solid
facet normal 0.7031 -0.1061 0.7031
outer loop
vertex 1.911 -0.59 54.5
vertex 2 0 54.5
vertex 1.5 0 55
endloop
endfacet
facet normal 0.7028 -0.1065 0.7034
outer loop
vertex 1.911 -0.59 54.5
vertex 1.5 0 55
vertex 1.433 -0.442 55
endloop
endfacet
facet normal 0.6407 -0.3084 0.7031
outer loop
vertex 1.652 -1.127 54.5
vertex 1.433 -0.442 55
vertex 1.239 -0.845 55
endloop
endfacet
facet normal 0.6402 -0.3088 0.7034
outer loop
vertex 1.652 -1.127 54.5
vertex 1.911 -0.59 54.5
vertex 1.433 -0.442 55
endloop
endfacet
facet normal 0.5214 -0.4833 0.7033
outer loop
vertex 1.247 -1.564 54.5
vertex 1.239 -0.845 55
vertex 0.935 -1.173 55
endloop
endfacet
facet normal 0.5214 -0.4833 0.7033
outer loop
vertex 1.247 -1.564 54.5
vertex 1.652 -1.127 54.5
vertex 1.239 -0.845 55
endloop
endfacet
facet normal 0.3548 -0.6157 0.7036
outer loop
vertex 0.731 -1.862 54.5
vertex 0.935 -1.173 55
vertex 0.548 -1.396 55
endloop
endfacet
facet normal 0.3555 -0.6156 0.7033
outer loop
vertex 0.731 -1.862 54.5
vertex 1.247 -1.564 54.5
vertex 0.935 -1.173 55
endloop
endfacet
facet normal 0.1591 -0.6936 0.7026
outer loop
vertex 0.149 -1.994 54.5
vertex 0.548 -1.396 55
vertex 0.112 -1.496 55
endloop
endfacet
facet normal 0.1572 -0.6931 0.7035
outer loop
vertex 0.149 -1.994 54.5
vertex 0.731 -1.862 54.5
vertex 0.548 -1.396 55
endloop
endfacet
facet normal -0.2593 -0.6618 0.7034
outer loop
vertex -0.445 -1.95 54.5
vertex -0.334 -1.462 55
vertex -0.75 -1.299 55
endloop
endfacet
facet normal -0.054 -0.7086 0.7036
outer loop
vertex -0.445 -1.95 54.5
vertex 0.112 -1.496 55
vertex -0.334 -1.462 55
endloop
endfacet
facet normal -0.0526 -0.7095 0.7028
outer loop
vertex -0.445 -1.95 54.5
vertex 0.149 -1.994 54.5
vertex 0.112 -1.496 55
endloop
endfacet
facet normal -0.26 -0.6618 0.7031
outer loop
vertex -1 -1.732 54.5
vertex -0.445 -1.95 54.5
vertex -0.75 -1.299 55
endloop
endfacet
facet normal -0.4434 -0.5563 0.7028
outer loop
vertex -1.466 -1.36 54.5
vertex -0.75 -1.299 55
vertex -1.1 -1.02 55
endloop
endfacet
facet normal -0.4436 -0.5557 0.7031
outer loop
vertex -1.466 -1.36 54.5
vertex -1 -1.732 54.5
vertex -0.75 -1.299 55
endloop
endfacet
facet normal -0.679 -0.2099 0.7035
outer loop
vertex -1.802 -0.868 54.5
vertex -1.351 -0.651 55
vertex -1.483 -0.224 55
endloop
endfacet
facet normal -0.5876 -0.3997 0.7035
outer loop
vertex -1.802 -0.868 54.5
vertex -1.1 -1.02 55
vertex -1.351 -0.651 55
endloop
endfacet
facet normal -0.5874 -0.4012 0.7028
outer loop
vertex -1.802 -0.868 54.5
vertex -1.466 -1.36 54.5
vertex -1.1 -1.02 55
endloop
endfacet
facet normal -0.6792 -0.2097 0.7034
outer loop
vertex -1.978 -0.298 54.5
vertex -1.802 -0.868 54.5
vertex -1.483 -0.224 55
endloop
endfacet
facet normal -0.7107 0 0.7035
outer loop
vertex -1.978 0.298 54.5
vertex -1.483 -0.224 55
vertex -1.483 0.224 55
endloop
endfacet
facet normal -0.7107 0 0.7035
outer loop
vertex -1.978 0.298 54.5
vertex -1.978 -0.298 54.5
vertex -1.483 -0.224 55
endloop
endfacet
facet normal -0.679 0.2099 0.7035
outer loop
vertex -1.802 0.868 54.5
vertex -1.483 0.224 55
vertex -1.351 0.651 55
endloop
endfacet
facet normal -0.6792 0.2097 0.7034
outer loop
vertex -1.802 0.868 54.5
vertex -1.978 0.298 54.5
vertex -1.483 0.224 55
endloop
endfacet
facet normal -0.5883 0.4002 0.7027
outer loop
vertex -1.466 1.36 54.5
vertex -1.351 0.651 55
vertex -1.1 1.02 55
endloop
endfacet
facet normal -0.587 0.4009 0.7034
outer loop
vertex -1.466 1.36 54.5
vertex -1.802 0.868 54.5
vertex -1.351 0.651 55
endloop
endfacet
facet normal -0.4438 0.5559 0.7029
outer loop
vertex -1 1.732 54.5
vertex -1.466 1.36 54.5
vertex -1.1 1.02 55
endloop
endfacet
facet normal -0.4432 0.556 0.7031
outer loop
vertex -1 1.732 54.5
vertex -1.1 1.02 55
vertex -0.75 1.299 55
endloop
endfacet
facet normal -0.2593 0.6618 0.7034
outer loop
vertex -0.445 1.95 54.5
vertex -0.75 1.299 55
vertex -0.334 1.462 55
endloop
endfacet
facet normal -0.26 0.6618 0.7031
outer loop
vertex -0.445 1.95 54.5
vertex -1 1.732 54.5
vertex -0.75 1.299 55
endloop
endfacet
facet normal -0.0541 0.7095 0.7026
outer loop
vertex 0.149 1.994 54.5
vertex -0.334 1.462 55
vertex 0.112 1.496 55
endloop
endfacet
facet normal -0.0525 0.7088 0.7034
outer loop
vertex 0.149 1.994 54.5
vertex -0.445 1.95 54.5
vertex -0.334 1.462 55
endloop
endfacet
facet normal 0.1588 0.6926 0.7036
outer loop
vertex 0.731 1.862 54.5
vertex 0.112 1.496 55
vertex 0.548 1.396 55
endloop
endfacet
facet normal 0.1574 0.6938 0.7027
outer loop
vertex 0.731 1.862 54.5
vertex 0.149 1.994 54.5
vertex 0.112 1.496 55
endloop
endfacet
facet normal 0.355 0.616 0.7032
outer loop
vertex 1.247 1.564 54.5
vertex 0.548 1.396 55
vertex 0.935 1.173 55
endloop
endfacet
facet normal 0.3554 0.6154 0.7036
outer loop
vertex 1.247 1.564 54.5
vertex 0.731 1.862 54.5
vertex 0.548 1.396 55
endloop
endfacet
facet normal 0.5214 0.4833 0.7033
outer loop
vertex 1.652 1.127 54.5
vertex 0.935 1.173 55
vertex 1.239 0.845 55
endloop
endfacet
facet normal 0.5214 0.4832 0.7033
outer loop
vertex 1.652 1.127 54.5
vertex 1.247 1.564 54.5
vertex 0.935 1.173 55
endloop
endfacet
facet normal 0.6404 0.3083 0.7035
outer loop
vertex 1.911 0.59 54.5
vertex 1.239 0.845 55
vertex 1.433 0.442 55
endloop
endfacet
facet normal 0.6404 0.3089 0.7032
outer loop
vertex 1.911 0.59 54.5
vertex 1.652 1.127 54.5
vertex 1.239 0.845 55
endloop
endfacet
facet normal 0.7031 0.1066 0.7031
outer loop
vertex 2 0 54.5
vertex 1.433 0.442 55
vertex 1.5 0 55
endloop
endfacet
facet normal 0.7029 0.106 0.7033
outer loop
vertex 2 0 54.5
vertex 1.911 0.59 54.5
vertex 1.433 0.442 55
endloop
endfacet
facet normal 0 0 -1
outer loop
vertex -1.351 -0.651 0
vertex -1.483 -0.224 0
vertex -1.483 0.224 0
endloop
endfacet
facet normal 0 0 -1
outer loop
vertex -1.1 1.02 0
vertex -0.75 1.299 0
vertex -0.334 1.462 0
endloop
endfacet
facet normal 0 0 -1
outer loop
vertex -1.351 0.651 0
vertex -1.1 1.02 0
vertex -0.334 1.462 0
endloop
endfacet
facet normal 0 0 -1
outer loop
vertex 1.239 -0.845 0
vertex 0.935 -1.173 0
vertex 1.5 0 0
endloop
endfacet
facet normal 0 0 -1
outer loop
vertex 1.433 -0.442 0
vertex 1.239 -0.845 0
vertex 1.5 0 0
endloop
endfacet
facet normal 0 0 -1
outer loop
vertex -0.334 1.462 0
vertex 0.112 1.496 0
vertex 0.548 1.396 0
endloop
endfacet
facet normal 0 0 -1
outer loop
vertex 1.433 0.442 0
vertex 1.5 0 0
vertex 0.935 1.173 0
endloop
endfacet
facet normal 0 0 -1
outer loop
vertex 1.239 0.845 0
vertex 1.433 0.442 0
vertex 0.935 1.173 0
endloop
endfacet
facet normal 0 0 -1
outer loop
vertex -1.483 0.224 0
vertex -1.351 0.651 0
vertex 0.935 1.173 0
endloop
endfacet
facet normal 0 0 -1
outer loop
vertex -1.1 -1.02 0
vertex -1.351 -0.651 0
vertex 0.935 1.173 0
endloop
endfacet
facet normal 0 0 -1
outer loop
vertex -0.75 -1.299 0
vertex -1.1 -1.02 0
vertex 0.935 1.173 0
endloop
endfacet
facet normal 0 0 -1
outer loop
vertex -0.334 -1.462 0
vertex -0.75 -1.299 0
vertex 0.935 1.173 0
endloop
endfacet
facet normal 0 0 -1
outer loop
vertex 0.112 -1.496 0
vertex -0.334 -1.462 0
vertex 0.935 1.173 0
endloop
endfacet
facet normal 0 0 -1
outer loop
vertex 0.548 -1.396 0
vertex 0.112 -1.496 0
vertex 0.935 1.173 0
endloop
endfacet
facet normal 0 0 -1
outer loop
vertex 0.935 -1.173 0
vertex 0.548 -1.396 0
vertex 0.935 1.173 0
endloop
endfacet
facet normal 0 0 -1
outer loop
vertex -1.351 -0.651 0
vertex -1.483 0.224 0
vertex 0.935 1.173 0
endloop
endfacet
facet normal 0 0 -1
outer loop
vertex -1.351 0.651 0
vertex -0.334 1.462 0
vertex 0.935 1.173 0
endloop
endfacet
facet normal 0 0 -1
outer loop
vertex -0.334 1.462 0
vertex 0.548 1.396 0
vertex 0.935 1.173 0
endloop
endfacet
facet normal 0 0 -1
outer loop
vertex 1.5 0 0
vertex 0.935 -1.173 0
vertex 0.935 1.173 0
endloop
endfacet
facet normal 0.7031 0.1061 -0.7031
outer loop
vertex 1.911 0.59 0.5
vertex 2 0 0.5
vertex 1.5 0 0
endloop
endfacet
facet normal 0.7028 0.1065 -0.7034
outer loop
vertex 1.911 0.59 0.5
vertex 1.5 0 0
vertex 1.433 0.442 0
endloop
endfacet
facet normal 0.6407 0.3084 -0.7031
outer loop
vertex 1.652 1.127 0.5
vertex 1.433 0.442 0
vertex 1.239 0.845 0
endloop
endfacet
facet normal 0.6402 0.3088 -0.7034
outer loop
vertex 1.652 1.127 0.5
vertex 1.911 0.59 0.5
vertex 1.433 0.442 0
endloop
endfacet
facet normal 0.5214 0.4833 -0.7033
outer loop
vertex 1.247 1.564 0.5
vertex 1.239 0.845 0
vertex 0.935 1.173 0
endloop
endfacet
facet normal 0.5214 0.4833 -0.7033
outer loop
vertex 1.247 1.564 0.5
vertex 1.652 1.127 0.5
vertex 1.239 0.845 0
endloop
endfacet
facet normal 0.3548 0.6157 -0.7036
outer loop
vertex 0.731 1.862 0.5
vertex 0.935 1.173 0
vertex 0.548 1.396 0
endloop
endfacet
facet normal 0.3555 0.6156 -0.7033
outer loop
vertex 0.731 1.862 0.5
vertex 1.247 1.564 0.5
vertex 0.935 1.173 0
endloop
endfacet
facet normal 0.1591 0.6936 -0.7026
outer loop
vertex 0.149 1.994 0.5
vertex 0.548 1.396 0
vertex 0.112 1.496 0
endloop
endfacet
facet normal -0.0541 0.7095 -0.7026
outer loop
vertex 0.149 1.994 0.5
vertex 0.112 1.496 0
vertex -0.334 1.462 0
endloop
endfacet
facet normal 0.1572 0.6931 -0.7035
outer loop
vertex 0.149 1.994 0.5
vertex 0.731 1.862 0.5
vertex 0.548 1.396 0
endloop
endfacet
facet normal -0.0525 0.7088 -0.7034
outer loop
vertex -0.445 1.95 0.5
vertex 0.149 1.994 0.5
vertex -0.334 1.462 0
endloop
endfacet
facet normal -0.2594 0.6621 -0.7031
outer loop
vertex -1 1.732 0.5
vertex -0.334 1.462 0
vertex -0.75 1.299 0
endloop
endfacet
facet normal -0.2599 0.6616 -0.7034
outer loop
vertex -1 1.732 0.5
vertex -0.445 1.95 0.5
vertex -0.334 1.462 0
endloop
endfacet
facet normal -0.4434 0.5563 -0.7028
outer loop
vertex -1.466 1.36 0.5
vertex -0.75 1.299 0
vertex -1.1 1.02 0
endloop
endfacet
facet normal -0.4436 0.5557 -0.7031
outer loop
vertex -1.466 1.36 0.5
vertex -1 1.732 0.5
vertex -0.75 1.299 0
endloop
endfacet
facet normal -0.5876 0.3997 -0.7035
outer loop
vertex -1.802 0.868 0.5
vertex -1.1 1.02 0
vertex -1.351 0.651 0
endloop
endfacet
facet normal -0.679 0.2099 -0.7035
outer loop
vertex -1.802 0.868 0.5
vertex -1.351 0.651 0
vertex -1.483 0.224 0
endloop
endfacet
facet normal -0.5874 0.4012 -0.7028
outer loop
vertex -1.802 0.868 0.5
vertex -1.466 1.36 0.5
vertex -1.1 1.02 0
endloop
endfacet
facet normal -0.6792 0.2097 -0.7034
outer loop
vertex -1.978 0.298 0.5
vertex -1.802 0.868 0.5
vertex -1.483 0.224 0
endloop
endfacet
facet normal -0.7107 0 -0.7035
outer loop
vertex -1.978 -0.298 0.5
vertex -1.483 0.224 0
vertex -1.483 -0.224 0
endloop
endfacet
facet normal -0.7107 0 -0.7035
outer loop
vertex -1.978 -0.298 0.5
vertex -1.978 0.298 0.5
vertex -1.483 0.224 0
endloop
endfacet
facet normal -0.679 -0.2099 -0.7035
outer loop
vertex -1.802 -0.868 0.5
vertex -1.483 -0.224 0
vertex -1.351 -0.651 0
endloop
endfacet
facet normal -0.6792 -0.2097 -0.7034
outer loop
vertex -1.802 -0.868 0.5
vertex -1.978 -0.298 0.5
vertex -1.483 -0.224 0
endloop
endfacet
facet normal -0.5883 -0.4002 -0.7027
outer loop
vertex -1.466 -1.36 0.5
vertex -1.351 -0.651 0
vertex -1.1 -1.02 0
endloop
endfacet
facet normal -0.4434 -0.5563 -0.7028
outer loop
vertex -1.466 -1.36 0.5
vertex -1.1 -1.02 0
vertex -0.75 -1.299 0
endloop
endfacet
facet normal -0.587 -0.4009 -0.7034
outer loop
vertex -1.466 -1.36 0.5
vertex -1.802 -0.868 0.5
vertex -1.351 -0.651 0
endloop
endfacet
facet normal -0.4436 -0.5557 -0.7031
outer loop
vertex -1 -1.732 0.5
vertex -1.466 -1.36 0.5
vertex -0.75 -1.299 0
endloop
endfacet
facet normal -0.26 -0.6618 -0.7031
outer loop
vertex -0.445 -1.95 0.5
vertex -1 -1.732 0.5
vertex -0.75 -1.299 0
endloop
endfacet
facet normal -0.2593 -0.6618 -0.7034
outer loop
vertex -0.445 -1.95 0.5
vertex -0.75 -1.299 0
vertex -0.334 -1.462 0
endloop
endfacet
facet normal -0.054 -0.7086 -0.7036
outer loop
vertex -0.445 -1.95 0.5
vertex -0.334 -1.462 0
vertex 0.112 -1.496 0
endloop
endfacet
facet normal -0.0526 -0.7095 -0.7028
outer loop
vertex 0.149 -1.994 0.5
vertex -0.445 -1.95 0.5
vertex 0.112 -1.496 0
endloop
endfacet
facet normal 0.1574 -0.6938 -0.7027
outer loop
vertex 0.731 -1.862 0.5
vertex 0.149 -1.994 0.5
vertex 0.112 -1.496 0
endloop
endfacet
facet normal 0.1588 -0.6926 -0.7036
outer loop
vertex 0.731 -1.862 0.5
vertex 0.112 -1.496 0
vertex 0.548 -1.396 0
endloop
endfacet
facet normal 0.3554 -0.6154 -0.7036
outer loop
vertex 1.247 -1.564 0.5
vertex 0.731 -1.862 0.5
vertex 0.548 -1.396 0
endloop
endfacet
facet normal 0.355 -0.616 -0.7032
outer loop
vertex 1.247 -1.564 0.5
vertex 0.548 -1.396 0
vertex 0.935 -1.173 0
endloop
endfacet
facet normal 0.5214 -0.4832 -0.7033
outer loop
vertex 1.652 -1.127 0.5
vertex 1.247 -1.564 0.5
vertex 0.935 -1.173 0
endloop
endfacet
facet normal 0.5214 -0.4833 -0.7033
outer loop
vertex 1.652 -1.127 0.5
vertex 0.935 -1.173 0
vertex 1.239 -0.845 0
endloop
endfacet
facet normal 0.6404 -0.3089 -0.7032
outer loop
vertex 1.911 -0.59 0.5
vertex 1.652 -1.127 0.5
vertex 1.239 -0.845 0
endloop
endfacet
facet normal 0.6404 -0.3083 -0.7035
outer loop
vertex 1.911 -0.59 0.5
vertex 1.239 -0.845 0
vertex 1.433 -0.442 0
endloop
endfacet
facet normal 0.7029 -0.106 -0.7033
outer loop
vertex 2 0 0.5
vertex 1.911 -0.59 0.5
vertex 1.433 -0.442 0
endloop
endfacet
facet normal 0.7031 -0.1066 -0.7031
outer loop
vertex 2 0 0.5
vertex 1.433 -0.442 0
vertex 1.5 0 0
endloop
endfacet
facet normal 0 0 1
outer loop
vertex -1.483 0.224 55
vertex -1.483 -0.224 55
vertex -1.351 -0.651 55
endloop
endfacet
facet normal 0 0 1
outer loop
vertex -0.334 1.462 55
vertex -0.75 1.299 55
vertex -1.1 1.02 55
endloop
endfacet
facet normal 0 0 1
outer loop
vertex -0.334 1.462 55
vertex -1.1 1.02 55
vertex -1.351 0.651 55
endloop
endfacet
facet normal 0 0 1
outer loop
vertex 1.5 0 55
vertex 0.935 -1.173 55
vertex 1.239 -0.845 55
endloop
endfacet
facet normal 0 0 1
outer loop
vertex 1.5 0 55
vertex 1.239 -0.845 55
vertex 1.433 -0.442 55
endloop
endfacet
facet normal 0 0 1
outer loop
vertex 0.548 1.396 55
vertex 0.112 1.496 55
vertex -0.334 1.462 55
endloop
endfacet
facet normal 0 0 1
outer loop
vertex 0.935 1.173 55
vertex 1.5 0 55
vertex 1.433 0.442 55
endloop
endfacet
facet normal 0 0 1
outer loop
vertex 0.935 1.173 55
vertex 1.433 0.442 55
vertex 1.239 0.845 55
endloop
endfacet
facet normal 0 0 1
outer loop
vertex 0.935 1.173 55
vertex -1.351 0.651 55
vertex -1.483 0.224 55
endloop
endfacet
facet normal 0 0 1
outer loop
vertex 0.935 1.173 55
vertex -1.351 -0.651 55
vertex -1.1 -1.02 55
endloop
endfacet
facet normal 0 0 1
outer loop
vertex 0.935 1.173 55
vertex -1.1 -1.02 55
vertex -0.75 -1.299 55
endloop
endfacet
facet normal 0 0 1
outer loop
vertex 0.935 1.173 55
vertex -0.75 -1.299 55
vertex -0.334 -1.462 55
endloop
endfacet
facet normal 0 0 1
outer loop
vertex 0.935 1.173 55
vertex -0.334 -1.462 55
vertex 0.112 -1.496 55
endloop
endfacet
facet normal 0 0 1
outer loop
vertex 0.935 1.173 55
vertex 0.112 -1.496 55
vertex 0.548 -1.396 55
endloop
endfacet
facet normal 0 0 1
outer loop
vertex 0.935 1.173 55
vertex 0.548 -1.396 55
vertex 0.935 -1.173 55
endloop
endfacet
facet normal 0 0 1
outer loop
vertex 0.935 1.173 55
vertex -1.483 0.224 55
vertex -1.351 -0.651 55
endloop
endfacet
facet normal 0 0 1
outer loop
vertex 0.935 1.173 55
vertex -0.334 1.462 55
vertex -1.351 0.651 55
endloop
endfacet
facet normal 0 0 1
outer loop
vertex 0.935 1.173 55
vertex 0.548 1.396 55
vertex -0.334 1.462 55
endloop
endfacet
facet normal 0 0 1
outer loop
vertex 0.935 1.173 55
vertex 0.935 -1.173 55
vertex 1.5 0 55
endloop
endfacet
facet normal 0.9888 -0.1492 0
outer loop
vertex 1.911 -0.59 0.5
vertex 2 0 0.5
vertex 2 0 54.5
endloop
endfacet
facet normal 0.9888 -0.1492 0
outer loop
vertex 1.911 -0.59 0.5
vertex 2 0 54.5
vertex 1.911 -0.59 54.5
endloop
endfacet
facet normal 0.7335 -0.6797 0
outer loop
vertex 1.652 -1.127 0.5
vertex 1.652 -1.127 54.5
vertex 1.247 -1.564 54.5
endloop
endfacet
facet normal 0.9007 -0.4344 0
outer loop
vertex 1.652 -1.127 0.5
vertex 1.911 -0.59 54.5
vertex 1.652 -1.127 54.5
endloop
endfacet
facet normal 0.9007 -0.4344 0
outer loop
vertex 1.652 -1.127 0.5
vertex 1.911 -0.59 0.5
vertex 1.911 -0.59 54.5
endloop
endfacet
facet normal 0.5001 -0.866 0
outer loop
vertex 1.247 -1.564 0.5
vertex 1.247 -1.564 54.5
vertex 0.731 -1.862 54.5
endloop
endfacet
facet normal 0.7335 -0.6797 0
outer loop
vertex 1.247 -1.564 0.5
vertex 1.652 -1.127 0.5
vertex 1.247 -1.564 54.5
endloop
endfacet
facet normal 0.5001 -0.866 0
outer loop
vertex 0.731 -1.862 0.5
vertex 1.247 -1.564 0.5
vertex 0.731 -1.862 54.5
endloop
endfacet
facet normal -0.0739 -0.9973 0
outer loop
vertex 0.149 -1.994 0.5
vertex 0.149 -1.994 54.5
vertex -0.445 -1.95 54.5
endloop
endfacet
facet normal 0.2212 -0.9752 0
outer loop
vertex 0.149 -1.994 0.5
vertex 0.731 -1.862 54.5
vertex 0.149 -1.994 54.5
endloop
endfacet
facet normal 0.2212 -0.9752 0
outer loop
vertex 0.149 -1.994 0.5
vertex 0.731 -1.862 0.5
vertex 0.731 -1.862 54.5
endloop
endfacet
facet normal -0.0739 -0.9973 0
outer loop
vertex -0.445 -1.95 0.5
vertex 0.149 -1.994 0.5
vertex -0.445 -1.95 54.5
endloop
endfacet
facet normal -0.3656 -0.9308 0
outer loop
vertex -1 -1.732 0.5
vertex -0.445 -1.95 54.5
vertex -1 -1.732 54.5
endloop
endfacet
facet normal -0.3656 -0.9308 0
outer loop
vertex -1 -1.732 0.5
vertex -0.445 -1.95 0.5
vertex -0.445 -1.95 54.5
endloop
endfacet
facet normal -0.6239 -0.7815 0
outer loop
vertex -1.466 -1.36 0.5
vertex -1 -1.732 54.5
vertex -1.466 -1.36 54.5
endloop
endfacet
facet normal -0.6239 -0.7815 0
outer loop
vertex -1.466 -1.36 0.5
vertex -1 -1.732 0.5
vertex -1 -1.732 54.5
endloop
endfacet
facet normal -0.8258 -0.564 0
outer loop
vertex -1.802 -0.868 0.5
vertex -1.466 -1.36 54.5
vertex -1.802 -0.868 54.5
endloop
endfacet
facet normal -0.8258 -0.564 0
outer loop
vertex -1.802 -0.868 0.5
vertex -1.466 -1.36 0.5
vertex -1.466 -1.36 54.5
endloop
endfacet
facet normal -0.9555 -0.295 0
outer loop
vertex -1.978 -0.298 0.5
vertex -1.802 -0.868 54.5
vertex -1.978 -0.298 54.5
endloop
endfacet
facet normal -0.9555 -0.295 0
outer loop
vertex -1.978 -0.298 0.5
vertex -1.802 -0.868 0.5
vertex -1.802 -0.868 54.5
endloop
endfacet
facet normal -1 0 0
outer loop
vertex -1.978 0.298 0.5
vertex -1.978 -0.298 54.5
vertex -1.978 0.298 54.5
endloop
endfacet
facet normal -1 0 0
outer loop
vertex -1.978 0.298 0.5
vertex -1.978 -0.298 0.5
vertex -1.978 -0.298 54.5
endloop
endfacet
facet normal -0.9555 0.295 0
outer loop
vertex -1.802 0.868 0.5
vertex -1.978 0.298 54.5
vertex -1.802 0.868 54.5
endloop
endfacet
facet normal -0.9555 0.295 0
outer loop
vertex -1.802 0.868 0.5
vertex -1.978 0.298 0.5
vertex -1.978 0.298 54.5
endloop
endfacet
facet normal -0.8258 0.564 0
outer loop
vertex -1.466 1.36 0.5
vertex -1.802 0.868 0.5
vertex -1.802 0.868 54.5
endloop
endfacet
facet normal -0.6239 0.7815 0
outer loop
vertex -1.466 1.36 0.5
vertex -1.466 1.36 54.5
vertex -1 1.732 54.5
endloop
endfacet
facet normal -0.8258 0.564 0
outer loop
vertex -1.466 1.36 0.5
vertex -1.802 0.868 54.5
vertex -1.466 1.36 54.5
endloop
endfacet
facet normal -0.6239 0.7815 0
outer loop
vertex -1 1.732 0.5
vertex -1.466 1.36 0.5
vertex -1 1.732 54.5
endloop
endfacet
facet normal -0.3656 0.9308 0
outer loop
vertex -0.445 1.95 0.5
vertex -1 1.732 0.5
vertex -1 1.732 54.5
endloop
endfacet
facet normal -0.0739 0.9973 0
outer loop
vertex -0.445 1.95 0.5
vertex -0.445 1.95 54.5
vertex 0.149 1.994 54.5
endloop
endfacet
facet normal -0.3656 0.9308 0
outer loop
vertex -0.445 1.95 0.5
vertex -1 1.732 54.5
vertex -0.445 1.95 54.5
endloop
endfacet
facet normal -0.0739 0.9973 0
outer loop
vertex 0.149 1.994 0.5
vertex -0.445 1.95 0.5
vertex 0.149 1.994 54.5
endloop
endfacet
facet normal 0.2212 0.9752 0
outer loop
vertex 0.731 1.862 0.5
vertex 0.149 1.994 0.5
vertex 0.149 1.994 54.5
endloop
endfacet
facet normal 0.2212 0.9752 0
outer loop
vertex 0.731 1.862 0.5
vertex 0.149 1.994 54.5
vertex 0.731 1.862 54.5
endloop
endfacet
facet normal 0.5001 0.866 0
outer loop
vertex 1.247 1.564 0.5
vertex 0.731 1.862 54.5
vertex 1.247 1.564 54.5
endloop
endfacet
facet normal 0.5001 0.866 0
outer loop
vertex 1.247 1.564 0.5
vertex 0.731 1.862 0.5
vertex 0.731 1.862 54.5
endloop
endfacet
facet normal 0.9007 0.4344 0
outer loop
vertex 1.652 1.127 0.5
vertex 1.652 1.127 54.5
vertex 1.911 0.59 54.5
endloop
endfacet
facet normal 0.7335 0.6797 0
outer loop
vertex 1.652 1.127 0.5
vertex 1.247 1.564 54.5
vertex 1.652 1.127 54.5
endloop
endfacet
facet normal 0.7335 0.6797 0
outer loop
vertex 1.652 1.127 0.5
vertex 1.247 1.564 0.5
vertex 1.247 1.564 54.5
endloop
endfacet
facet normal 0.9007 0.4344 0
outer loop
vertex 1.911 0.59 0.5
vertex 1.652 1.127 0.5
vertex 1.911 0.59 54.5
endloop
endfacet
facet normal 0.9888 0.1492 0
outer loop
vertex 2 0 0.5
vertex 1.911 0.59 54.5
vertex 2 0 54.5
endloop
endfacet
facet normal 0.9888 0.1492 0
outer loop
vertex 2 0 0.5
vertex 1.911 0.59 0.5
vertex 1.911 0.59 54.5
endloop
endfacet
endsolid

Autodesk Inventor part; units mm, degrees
ref_plane "YZ Plane" through (0, 0, 0) normal (1, 0, 0) x (0, 1, 0)
ref_plane "XZ Plane" through (0, 0, 0) normal (0, 1, 0) x (-1, 0, 0)
ref_plane "XY Plane" through (0, 0, 0) normal (0, 0, 1) x (1, 0, 0)
sketch "Skizze1" plane through (0, 0, 0) normal (0, 0, 1) x (1, 0, 0)
  circle A0 centre (0, 0) radius 2
  dimension "Durchmesser" = 4
extrude "Extrusion1" add sketch "Skizze1" along normal blind 55
chamfer "Fase1" distance 0.5 angle 45 1 edges at (-2, 0, 0) measured on face at (0.6473, -0.1595, 0)
chamfer "Fase2" distance 0.5 angle 45 1 edges at (-2, 0, 55) measured on face at (1.9935, -0.1609, 36.8333)
properties part number "ABI_Arretierstift"
